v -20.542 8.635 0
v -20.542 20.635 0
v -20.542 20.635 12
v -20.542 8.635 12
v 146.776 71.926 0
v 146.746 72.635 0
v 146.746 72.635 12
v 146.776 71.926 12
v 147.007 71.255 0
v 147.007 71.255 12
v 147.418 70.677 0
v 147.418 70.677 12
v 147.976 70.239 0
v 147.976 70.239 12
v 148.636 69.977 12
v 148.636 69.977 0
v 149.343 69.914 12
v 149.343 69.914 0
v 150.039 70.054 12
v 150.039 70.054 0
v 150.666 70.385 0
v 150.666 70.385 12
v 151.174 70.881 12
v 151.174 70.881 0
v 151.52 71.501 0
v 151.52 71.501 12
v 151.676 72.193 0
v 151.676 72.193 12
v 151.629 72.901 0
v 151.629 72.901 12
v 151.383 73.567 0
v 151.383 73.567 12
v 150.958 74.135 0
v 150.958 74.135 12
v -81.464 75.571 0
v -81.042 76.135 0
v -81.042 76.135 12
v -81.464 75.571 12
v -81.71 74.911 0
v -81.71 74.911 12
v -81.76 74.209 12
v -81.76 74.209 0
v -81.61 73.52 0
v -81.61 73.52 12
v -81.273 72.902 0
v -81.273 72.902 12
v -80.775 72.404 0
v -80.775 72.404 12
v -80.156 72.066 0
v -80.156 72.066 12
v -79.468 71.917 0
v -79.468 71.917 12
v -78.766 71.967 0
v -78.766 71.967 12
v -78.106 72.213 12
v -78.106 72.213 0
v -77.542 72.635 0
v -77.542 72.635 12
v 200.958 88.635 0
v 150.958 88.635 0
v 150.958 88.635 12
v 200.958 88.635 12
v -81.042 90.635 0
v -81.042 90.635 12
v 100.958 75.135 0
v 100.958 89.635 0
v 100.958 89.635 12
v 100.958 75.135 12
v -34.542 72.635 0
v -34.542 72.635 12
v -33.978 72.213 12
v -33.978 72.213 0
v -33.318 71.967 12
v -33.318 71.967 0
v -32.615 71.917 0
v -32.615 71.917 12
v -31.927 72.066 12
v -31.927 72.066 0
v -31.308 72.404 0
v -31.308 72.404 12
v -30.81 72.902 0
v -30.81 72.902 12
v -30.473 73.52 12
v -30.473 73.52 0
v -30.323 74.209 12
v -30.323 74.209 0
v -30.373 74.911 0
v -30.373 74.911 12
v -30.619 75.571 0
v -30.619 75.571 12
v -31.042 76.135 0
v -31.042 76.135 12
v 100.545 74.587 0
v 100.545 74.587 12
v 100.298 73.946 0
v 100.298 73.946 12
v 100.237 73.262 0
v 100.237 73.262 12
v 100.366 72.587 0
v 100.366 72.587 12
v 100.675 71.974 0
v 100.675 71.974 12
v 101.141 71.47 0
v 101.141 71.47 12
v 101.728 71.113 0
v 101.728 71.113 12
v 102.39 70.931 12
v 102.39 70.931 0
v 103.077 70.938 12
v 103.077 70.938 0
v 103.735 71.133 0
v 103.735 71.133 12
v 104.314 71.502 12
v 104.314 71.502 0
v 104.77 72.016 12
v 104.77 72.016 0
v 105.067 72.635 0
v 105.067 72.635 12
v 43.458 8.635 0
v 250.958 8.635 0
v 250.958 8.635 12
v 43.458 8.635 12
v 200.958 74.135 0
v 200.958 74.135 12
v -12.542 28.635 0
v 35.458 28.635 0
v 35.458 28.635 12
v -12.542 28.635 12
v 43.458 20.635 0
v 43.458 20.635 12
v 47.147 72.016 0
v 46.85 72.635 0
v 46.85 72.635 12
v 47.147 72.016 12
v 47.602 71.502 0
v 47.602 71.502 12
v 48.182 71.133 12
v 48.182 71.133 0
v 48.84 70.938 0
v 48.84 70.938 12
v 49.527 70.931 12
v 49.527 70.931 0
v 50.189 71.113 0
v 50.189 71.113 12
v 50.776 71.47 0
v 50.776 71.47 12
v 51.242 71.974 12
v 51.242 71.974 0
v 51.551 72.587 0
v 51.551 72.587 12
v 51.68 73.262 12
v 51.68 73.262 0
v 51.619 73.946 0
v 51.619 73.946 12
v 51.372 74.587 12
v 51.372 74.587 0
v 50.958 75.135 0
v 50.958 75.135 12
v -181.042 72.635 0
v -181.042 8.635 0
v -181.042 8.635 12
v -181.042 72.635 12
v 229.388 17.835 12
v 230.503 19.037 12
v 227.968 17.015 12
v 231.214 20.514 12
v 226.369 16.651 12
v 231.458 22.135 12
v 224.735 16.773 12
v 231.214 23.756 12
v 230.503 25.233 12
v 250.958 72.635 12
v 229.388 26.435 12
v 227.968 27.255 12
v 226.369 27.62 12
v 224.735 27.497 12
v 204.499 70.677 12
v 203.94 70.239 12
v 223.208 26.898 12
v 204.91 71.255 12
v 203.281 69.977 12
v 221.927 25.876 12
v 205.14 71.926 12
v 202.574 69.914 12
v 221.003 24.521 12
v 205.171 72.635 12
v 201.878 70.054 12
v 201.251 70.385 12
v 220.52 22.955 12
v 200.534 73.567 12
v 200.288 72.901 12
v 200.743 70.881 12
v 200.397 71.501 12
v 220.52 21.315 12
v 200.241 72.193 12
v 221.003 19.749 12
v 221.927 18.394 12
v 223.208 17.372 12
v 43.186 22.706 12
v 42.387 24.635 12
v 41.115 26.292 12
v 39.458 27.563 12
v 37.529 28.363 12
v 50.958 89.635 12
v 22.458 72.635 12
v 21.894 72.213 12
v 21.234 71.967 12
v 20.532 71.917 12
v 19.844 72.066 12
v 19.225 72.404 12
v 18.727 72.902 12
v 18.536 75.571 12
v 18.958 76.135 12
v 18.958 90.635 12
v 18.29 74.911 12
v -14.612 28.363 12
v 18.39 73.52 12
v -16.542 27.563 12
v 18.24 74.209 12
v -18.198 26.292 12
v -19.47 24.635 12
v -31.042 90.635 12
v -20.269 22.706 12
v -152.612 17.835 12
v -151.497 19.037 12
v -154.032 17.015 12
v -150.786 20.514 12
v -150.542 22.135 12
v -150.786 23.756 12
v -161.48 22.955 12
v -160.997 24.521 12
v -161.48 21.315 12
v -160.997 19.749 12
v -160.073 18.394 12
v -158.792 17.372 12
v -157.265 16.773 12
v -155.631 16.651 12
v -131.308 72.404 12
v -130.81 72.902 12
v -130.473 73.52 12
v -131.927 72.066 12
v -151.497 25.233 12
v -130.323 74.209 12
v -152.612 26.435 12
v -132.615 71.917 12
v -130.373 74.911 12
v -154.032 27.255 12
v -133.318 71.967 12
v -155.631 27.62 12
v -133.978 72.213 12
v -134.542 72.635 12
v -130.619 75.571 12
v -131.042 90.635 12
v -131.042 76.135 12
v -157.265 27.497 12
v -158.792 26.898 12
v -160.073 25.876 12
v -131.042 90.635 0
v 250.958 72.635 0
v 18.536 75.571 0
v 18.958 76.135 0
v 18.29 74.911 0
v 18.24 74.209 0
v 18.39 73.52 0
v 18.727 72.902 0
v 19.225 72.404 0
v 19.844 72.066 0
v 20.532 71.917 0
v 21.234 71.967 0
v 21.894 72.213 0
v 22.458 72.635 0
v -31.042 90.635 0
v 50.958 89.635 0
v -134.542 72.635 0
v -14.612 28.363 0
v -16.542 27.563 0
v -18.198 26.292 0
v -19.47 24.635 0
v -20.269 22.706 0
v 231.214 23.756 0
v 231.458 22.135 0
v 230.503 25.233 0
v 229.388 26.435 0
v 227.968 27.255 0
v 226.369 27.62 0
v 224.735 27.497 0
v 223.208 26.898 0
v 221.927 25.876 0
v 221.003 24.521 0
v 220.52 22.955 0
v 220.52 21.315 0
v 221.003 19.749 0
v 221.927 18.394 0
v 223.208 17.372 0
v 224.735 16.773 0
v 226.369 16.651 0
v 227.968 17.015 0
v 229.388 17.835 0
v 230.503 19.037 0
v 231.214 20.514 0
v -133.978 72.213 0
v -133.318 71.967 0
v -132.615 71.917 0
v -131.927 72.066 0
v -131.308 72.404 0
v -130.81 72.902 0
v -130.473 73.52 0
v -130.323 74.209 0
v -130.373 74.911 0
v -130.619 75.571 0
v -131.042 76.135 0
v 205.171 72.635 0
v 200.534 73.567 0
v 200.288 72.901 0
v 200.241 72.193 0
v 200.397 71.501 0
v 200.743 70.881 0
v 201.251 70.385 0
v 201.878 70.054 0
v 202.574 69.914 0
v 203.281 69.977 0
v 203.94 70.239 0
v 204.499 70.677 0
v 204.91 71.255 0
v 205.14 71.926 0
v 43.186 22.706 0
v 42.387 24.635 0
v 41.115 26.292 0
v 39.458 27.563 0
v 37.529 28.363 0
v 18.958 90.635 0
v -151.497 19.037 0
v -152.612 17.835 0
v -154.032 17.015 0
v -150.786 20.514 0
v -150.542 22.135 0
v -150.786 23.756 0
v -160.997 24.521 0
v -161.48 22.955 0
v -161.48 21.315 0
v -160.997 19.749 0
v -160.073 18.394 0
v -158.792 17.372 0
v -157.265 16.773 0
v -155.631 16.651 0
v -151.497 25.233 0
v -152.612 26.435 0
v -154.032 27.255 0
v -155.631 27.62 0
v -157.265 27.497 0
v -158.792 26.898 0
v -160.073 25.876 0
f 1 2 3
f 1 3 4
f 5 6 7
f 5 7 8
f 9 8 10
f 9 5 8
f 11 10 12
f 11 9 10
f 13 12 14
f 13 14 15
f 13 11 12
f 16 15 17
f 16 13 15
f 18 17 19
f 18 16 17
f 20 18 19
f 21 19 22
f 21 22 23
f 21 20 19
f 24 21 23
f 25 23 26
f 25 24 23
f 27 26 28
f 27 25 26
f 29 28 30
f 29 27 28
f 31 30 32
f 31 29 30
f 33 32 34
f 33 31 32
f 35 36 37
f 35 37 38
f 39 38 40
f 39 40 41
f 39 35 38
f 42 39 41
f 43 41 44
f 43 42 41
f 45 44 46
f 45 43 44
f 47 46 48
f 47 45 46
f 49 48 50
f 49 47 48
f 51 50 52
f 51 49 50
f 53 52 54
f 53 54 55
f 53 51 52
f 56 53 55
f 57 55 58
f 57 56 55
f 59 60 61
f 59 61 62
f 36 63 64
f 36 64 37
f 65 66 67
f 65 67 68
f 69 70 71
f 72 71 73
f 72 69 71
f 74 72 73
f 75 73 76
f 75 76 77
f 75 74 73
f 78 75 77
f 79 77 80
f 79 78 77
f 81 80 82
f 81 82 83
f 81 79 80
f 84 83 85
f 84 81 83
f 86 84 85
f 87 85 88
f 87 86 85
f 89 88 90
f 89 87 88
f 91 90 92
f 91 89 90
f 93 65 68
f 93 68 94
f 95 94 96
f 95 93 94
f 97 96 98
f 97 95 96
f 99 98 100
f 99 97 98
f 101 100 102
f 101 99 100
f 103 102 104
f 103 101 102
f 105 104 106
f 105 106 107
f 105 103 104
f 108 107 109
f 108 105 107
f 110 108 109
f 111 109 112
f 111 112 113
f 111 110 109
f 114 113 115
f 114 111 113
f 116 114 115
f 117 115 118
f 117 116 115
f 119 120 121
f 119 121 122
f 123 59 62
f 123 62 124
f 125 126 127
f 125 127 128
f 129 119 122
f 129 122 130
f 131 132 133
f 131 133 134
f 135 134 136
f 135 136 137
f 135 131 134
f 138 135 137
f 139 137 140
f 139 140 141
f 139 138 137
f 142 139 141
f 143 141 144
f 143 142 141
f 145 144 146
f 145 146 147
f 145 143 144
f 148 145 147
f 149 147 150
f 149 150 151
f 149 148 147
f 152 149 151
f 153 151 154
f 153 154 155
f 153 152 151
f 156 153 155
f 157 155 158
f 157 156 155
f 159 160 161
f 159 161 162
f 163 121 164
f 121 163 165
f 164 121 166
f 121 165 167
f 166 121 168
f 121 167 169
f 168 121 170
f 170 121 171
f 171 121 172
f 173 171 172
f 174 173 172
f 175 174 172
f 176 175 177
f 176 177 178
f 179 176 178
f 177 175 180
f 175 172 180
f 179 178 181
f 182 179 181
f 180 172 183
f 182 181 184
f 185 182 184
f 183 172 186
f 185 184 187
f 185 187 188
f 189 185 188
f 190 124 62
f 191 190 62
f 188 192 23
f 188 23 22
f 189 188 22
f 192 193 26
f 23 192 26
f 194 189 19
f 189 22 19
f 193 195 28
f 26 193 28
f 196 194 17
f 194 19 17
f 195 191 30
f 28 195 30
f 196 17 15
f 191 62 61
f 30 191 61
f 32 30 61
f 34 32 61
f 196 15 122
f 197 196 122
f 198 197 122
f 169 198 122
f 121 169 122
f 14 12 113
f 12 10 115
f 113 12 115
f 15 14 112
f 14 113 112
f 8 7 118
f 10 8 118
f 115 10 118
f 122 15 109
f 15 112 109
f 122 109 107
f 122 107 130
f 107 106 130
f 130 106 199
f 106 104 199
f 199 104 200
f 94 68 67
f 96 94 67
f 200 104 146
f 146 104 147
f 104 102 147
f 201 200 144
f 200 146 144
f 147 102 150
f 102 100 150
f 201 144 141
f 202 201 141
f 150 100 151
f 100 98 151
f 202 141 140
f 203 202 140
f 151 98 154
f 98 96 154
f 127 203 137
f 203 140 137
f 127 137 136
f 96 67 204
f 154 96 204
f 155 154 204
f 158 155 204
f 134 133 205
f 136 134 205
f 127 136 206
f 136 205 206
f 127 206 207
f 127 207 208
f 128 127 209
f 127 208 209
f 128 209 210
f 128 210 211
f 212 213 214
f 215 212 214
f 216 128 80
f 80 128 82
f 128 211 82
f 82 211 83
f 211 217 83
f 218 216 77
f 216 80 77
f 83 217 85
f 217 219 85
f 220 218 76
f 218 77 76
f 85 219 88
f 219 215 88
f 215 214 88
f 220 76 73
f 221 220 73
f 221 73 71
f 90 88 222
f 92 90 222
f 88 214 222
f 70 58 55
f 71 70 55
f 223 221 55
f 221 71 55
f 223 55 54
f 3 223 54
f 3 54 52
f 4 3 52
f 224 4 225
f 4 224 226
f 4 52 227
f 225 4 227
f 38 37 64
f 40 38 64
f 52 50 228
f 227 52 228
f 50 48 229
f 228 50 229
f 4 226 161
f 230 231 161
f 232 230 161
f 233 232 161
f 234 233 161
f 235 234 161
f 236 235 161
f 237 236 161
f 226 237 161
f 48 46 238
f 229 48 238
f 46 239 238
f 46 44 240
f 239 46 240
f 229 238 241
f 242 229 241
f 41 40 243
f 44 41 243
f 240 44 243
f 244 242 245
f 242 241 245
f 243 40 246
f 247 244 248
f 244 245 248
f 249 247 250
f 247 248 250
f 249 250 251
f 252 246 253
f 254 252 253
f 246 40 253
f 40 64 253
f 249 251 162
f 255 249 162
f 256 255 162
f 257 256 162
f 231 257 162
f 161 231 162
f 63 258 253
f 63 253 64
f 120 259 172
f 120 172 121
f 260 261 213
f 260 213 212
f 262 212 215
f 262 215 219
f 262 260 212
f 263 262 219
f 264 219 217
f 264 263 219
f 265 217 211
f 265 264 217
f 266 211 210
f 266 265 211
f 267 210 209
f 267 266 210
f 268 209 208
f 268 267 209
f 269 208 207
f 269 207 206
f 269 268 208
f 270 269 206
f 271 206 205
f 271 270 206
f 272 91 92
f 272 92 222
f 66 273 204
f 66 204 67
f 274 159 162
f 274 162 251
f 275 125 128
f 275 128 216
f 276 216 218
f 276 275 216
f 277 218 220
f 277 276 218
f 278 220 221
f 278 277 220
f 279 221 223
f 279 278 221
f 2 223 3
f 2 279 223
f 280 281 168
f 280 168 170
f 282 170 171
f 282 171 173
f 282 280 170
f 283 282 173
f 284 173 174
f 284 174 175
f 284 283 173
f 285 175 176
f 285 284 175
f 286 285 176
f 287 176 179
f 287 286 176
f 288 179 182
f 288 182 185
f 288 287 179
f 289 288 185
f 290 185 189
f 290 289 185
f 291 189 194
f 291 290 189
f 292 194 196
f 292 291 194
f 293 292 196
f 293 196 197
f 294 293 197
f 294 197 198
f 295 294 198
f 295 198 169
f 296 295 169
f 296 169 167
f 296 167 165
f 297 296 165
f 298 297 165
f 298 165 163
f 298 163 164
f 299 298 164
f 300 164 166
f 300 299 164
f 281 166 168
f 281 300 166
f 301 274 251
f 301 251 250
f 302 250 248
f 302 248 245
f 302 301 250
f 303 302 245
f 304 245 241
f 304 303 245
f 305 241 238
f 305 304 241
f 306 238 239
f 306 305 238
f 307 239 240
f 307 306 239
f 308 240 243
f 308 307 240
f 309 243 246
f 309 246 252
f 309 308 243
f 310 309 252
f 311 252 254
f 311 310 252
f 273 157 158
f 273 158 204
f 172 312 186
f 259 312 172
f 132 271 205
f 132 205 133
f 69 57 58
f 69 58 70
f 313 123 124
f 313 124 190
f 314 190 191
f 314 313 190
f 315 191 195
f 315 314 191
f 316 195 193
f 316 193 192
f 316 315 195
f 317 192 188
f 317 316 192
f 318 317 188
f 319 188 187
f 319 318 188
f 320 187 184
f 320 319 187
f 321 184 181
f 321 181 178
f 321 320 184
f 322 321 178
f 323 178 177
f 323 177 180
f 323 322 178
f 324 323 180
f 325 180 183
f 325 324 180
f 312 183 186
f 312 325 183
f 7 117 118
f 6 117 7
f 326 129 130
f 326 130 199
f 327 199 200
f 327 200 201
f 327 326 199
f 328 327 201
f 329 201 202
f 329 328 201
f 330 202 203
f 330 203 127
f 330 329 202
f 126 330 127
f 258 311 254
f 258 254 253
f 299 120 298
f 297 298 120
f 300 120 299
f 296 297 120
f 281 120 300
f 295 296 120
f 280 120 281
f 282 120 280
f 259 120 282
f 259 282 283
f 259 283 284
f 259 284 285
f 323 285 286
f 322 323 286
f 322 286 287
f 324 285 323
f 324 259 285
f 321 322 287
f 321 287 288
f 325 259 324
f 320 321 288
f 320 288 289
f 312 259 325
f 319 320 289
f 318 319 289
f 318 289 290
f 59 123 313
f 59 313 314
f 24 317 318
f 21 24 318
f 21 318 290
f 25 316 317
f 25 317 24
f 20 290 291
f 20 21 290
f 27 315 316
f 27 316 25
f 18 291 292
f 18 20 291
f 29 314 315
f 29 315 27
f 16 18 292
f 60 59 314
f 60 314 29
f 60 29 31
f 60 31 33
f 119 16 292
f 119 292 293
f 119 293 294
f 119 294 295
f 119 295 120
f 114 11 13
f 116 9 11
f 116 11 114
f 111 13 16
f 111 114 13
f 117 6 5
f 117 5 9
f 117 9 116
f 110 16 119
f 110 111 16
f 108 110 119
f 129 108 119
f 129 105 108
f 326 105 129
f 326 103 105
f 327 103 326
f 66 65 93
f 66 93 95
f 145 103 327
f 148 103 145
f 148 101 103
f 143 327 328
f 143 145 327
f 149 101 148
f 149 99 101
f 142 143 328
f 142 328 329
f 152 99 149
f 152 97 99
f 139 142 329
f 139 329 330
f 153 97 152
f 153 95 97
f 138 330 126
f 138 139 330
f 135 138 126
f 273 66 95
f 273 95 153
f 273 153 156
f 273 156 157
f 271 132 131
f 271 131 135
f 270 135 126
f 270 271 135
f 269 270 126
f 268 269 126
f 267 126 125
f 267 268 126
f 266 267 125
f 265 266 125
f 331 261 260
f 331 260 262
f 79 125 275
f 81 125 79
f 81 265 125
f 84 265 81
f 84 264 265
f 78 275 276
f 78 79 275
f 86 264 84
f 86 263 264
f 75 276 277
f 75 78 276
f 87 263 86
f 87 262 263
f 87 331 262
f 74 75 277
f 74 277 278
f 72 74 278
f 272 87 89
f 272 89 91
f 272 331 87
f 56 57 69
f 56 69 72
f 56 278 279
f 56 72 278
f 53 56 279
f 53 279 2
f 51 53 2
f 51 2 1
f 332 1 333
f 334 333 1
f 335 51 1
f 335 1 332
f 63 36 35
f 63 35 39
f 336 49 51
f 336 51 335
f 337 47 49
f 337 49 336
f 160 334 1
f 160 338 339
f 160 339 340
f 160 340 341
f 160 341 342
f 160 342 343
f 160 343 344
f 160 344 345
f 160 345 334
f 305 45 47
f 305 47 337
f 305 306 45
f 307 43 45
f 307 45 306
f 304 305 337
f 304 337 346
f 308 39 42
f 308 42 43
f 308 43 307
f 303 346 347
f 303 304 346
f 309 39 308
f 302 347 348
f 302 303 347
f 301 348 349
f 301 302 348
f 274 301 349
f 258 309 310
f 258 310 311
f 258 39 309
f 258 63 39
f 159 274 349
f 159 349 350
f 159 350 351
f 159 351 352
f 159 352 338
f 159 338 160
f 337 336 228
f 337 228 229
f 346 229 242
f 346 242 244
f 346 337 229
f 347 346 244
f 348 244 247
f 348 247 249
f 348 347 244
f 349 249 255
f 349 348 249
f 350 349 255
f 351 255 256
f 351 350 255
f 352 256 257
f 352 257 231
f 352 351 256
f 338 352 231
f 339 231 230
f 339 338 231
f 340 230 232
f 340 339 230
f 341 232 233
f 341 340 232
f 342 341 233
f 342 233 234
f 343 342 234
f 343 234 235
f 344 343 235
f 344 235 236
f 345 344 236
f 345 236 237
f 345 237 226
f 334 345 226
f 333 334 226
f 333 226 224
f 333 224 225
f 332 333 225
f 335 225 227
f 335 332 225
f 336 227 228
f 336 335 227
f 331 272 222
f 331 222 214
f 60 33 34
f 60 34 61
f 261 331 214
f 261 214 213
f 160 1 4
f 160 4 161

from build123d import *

# Parameters (mm, degrees)
CROQUIS1_R              = 5.5
SALIENTE_EXTRUIR1_DEPTH = 12


with BuildPart() as part:
    # Croquis1 → Saliente-Extruir1 (new body)
    with BuildSketch(Plane.XY):
        with BuildLine():
            Line((-181.041600866, 72.635135135), (-134.541600866, 72.635135135))
            ThreePointArc((-134.541600866, 72.635135135), (-131.041600866, 72.635135135), (-131.041600866, 76.135135135))
            Line((-131.041600866, 76.135135135), (-131.041600866, 90.635135135))
            Line((-131.041600866, 90.635135135), (-81.041600866, 90.635135135))
            Line((-81.041600866, 90.635135135), (-81.041600866, 76.135135135))
            ThreePointArc((-81.041600866, 76.135135135), (-81.041600866, 72.635135135), (-77.541600866, 72.635135135))
            Line((-77.541600866, 72.635135135), (-34.541600866, 72.635135135))
            ThreePointArc((-34.541600866, 72.635135135), (-31.041600866, 72.635135135), (-31.041600866, 76.135135135))
            Line((-31.041600866, 76.135135135), (-31.041600866, 90.635135135))
            Line((-31.041600866, 90.635135135), (18.958399134, 90.635135135))
            Line((18.958399134, 90.635135135), (18.958399134, 76.135135135))
            ThreePointArc((18.958399134, 76.135135135), (18.958399134, 72.635135135), (22.458399134, 72.635135135))
            Line((22.458399134, 72.635135135), (46.849903851, 72.635135135))
            ThreePointArc((46.849903851, 72.635135135), (50.494893062, 71.270913441), (50.958399134, 75.135135135))
            Line((50.958399134, 75.135135135), (50.958399134, 89.635135135))
            Line((50.958399134, 89.635135135), (100.958399134, 89.635135135))
            Line((100.958399134, 89.635135135), (100.958399134, 75.135135135))
            ThreePointArc((100.958399134, 75.135135135), (101.421905205, 71.270913441), (105.066894417, 72.635135135))
            Line((105.066894417, 72.635135135), (146.746184683, 72.635135135))
            ThreePointArc((146.746184683, 72.635135135), (150.038647504, 70.053679014), (150.958399134, 74.135135135))
            Line((150.958399134, 74.135135135), (150.958399134, 88.635135135))
            Line((150.958399134, 88.635135135), (200.958399134, 88.635135135))
            Line((200.958399134, 88.635135135), (200.958399134, 74.135135135))
            ThreePointArc((200.958399134, 74.135135135), (201.878150764, 70.053679014), (205.170613584, 72.635135135))
            Line((205.170613584, 72.635135135), (250.958399134, 72.635135135))
            Line((250.958399134, 72.635135135), (250.958399134, 8.635135135))
            Line((250.958399134, 8.635135135), (43.458399134, 8.635135135))
            Line((43.458399134, 8.635135135), (43.458399134, 20.635135135))
            ThreePointArc((43.458399134, 20.635135135), (41.115253383, 26.291989385), (35.458399134, 28.635135135))
            Line((35.458399134, 28.635135135), (-12.541600866, 28.635135135))
            ThreePointArc((-12.541600866, 28.635135135), (-18.198455116, 26.291989385), (-20.541600866, 20.635135135))
            Line((-20.541600866, 20.635135135), (-20.541600866, 8.635135135))
            Line((-20.541600866, 8.635135135), (-181.041600866, 8.635135135))
            Line((-181.041600866, 8.635135135), (-181.041600866, 72.635135135))
        make_face()
        with Locations((-156.041600866, 22.135135135)):
            Circle(CROQUIS1_R, mode=Mode.SUBTRACT)
        with Locations((225.958399134, 22.135135135)):
            Circle(CROQUIS1_R, mode=Mode.SUBTRACT)
    extrude(amount=SALIENTE_EXTRUIR1_DEPTH)


solid = part.part
